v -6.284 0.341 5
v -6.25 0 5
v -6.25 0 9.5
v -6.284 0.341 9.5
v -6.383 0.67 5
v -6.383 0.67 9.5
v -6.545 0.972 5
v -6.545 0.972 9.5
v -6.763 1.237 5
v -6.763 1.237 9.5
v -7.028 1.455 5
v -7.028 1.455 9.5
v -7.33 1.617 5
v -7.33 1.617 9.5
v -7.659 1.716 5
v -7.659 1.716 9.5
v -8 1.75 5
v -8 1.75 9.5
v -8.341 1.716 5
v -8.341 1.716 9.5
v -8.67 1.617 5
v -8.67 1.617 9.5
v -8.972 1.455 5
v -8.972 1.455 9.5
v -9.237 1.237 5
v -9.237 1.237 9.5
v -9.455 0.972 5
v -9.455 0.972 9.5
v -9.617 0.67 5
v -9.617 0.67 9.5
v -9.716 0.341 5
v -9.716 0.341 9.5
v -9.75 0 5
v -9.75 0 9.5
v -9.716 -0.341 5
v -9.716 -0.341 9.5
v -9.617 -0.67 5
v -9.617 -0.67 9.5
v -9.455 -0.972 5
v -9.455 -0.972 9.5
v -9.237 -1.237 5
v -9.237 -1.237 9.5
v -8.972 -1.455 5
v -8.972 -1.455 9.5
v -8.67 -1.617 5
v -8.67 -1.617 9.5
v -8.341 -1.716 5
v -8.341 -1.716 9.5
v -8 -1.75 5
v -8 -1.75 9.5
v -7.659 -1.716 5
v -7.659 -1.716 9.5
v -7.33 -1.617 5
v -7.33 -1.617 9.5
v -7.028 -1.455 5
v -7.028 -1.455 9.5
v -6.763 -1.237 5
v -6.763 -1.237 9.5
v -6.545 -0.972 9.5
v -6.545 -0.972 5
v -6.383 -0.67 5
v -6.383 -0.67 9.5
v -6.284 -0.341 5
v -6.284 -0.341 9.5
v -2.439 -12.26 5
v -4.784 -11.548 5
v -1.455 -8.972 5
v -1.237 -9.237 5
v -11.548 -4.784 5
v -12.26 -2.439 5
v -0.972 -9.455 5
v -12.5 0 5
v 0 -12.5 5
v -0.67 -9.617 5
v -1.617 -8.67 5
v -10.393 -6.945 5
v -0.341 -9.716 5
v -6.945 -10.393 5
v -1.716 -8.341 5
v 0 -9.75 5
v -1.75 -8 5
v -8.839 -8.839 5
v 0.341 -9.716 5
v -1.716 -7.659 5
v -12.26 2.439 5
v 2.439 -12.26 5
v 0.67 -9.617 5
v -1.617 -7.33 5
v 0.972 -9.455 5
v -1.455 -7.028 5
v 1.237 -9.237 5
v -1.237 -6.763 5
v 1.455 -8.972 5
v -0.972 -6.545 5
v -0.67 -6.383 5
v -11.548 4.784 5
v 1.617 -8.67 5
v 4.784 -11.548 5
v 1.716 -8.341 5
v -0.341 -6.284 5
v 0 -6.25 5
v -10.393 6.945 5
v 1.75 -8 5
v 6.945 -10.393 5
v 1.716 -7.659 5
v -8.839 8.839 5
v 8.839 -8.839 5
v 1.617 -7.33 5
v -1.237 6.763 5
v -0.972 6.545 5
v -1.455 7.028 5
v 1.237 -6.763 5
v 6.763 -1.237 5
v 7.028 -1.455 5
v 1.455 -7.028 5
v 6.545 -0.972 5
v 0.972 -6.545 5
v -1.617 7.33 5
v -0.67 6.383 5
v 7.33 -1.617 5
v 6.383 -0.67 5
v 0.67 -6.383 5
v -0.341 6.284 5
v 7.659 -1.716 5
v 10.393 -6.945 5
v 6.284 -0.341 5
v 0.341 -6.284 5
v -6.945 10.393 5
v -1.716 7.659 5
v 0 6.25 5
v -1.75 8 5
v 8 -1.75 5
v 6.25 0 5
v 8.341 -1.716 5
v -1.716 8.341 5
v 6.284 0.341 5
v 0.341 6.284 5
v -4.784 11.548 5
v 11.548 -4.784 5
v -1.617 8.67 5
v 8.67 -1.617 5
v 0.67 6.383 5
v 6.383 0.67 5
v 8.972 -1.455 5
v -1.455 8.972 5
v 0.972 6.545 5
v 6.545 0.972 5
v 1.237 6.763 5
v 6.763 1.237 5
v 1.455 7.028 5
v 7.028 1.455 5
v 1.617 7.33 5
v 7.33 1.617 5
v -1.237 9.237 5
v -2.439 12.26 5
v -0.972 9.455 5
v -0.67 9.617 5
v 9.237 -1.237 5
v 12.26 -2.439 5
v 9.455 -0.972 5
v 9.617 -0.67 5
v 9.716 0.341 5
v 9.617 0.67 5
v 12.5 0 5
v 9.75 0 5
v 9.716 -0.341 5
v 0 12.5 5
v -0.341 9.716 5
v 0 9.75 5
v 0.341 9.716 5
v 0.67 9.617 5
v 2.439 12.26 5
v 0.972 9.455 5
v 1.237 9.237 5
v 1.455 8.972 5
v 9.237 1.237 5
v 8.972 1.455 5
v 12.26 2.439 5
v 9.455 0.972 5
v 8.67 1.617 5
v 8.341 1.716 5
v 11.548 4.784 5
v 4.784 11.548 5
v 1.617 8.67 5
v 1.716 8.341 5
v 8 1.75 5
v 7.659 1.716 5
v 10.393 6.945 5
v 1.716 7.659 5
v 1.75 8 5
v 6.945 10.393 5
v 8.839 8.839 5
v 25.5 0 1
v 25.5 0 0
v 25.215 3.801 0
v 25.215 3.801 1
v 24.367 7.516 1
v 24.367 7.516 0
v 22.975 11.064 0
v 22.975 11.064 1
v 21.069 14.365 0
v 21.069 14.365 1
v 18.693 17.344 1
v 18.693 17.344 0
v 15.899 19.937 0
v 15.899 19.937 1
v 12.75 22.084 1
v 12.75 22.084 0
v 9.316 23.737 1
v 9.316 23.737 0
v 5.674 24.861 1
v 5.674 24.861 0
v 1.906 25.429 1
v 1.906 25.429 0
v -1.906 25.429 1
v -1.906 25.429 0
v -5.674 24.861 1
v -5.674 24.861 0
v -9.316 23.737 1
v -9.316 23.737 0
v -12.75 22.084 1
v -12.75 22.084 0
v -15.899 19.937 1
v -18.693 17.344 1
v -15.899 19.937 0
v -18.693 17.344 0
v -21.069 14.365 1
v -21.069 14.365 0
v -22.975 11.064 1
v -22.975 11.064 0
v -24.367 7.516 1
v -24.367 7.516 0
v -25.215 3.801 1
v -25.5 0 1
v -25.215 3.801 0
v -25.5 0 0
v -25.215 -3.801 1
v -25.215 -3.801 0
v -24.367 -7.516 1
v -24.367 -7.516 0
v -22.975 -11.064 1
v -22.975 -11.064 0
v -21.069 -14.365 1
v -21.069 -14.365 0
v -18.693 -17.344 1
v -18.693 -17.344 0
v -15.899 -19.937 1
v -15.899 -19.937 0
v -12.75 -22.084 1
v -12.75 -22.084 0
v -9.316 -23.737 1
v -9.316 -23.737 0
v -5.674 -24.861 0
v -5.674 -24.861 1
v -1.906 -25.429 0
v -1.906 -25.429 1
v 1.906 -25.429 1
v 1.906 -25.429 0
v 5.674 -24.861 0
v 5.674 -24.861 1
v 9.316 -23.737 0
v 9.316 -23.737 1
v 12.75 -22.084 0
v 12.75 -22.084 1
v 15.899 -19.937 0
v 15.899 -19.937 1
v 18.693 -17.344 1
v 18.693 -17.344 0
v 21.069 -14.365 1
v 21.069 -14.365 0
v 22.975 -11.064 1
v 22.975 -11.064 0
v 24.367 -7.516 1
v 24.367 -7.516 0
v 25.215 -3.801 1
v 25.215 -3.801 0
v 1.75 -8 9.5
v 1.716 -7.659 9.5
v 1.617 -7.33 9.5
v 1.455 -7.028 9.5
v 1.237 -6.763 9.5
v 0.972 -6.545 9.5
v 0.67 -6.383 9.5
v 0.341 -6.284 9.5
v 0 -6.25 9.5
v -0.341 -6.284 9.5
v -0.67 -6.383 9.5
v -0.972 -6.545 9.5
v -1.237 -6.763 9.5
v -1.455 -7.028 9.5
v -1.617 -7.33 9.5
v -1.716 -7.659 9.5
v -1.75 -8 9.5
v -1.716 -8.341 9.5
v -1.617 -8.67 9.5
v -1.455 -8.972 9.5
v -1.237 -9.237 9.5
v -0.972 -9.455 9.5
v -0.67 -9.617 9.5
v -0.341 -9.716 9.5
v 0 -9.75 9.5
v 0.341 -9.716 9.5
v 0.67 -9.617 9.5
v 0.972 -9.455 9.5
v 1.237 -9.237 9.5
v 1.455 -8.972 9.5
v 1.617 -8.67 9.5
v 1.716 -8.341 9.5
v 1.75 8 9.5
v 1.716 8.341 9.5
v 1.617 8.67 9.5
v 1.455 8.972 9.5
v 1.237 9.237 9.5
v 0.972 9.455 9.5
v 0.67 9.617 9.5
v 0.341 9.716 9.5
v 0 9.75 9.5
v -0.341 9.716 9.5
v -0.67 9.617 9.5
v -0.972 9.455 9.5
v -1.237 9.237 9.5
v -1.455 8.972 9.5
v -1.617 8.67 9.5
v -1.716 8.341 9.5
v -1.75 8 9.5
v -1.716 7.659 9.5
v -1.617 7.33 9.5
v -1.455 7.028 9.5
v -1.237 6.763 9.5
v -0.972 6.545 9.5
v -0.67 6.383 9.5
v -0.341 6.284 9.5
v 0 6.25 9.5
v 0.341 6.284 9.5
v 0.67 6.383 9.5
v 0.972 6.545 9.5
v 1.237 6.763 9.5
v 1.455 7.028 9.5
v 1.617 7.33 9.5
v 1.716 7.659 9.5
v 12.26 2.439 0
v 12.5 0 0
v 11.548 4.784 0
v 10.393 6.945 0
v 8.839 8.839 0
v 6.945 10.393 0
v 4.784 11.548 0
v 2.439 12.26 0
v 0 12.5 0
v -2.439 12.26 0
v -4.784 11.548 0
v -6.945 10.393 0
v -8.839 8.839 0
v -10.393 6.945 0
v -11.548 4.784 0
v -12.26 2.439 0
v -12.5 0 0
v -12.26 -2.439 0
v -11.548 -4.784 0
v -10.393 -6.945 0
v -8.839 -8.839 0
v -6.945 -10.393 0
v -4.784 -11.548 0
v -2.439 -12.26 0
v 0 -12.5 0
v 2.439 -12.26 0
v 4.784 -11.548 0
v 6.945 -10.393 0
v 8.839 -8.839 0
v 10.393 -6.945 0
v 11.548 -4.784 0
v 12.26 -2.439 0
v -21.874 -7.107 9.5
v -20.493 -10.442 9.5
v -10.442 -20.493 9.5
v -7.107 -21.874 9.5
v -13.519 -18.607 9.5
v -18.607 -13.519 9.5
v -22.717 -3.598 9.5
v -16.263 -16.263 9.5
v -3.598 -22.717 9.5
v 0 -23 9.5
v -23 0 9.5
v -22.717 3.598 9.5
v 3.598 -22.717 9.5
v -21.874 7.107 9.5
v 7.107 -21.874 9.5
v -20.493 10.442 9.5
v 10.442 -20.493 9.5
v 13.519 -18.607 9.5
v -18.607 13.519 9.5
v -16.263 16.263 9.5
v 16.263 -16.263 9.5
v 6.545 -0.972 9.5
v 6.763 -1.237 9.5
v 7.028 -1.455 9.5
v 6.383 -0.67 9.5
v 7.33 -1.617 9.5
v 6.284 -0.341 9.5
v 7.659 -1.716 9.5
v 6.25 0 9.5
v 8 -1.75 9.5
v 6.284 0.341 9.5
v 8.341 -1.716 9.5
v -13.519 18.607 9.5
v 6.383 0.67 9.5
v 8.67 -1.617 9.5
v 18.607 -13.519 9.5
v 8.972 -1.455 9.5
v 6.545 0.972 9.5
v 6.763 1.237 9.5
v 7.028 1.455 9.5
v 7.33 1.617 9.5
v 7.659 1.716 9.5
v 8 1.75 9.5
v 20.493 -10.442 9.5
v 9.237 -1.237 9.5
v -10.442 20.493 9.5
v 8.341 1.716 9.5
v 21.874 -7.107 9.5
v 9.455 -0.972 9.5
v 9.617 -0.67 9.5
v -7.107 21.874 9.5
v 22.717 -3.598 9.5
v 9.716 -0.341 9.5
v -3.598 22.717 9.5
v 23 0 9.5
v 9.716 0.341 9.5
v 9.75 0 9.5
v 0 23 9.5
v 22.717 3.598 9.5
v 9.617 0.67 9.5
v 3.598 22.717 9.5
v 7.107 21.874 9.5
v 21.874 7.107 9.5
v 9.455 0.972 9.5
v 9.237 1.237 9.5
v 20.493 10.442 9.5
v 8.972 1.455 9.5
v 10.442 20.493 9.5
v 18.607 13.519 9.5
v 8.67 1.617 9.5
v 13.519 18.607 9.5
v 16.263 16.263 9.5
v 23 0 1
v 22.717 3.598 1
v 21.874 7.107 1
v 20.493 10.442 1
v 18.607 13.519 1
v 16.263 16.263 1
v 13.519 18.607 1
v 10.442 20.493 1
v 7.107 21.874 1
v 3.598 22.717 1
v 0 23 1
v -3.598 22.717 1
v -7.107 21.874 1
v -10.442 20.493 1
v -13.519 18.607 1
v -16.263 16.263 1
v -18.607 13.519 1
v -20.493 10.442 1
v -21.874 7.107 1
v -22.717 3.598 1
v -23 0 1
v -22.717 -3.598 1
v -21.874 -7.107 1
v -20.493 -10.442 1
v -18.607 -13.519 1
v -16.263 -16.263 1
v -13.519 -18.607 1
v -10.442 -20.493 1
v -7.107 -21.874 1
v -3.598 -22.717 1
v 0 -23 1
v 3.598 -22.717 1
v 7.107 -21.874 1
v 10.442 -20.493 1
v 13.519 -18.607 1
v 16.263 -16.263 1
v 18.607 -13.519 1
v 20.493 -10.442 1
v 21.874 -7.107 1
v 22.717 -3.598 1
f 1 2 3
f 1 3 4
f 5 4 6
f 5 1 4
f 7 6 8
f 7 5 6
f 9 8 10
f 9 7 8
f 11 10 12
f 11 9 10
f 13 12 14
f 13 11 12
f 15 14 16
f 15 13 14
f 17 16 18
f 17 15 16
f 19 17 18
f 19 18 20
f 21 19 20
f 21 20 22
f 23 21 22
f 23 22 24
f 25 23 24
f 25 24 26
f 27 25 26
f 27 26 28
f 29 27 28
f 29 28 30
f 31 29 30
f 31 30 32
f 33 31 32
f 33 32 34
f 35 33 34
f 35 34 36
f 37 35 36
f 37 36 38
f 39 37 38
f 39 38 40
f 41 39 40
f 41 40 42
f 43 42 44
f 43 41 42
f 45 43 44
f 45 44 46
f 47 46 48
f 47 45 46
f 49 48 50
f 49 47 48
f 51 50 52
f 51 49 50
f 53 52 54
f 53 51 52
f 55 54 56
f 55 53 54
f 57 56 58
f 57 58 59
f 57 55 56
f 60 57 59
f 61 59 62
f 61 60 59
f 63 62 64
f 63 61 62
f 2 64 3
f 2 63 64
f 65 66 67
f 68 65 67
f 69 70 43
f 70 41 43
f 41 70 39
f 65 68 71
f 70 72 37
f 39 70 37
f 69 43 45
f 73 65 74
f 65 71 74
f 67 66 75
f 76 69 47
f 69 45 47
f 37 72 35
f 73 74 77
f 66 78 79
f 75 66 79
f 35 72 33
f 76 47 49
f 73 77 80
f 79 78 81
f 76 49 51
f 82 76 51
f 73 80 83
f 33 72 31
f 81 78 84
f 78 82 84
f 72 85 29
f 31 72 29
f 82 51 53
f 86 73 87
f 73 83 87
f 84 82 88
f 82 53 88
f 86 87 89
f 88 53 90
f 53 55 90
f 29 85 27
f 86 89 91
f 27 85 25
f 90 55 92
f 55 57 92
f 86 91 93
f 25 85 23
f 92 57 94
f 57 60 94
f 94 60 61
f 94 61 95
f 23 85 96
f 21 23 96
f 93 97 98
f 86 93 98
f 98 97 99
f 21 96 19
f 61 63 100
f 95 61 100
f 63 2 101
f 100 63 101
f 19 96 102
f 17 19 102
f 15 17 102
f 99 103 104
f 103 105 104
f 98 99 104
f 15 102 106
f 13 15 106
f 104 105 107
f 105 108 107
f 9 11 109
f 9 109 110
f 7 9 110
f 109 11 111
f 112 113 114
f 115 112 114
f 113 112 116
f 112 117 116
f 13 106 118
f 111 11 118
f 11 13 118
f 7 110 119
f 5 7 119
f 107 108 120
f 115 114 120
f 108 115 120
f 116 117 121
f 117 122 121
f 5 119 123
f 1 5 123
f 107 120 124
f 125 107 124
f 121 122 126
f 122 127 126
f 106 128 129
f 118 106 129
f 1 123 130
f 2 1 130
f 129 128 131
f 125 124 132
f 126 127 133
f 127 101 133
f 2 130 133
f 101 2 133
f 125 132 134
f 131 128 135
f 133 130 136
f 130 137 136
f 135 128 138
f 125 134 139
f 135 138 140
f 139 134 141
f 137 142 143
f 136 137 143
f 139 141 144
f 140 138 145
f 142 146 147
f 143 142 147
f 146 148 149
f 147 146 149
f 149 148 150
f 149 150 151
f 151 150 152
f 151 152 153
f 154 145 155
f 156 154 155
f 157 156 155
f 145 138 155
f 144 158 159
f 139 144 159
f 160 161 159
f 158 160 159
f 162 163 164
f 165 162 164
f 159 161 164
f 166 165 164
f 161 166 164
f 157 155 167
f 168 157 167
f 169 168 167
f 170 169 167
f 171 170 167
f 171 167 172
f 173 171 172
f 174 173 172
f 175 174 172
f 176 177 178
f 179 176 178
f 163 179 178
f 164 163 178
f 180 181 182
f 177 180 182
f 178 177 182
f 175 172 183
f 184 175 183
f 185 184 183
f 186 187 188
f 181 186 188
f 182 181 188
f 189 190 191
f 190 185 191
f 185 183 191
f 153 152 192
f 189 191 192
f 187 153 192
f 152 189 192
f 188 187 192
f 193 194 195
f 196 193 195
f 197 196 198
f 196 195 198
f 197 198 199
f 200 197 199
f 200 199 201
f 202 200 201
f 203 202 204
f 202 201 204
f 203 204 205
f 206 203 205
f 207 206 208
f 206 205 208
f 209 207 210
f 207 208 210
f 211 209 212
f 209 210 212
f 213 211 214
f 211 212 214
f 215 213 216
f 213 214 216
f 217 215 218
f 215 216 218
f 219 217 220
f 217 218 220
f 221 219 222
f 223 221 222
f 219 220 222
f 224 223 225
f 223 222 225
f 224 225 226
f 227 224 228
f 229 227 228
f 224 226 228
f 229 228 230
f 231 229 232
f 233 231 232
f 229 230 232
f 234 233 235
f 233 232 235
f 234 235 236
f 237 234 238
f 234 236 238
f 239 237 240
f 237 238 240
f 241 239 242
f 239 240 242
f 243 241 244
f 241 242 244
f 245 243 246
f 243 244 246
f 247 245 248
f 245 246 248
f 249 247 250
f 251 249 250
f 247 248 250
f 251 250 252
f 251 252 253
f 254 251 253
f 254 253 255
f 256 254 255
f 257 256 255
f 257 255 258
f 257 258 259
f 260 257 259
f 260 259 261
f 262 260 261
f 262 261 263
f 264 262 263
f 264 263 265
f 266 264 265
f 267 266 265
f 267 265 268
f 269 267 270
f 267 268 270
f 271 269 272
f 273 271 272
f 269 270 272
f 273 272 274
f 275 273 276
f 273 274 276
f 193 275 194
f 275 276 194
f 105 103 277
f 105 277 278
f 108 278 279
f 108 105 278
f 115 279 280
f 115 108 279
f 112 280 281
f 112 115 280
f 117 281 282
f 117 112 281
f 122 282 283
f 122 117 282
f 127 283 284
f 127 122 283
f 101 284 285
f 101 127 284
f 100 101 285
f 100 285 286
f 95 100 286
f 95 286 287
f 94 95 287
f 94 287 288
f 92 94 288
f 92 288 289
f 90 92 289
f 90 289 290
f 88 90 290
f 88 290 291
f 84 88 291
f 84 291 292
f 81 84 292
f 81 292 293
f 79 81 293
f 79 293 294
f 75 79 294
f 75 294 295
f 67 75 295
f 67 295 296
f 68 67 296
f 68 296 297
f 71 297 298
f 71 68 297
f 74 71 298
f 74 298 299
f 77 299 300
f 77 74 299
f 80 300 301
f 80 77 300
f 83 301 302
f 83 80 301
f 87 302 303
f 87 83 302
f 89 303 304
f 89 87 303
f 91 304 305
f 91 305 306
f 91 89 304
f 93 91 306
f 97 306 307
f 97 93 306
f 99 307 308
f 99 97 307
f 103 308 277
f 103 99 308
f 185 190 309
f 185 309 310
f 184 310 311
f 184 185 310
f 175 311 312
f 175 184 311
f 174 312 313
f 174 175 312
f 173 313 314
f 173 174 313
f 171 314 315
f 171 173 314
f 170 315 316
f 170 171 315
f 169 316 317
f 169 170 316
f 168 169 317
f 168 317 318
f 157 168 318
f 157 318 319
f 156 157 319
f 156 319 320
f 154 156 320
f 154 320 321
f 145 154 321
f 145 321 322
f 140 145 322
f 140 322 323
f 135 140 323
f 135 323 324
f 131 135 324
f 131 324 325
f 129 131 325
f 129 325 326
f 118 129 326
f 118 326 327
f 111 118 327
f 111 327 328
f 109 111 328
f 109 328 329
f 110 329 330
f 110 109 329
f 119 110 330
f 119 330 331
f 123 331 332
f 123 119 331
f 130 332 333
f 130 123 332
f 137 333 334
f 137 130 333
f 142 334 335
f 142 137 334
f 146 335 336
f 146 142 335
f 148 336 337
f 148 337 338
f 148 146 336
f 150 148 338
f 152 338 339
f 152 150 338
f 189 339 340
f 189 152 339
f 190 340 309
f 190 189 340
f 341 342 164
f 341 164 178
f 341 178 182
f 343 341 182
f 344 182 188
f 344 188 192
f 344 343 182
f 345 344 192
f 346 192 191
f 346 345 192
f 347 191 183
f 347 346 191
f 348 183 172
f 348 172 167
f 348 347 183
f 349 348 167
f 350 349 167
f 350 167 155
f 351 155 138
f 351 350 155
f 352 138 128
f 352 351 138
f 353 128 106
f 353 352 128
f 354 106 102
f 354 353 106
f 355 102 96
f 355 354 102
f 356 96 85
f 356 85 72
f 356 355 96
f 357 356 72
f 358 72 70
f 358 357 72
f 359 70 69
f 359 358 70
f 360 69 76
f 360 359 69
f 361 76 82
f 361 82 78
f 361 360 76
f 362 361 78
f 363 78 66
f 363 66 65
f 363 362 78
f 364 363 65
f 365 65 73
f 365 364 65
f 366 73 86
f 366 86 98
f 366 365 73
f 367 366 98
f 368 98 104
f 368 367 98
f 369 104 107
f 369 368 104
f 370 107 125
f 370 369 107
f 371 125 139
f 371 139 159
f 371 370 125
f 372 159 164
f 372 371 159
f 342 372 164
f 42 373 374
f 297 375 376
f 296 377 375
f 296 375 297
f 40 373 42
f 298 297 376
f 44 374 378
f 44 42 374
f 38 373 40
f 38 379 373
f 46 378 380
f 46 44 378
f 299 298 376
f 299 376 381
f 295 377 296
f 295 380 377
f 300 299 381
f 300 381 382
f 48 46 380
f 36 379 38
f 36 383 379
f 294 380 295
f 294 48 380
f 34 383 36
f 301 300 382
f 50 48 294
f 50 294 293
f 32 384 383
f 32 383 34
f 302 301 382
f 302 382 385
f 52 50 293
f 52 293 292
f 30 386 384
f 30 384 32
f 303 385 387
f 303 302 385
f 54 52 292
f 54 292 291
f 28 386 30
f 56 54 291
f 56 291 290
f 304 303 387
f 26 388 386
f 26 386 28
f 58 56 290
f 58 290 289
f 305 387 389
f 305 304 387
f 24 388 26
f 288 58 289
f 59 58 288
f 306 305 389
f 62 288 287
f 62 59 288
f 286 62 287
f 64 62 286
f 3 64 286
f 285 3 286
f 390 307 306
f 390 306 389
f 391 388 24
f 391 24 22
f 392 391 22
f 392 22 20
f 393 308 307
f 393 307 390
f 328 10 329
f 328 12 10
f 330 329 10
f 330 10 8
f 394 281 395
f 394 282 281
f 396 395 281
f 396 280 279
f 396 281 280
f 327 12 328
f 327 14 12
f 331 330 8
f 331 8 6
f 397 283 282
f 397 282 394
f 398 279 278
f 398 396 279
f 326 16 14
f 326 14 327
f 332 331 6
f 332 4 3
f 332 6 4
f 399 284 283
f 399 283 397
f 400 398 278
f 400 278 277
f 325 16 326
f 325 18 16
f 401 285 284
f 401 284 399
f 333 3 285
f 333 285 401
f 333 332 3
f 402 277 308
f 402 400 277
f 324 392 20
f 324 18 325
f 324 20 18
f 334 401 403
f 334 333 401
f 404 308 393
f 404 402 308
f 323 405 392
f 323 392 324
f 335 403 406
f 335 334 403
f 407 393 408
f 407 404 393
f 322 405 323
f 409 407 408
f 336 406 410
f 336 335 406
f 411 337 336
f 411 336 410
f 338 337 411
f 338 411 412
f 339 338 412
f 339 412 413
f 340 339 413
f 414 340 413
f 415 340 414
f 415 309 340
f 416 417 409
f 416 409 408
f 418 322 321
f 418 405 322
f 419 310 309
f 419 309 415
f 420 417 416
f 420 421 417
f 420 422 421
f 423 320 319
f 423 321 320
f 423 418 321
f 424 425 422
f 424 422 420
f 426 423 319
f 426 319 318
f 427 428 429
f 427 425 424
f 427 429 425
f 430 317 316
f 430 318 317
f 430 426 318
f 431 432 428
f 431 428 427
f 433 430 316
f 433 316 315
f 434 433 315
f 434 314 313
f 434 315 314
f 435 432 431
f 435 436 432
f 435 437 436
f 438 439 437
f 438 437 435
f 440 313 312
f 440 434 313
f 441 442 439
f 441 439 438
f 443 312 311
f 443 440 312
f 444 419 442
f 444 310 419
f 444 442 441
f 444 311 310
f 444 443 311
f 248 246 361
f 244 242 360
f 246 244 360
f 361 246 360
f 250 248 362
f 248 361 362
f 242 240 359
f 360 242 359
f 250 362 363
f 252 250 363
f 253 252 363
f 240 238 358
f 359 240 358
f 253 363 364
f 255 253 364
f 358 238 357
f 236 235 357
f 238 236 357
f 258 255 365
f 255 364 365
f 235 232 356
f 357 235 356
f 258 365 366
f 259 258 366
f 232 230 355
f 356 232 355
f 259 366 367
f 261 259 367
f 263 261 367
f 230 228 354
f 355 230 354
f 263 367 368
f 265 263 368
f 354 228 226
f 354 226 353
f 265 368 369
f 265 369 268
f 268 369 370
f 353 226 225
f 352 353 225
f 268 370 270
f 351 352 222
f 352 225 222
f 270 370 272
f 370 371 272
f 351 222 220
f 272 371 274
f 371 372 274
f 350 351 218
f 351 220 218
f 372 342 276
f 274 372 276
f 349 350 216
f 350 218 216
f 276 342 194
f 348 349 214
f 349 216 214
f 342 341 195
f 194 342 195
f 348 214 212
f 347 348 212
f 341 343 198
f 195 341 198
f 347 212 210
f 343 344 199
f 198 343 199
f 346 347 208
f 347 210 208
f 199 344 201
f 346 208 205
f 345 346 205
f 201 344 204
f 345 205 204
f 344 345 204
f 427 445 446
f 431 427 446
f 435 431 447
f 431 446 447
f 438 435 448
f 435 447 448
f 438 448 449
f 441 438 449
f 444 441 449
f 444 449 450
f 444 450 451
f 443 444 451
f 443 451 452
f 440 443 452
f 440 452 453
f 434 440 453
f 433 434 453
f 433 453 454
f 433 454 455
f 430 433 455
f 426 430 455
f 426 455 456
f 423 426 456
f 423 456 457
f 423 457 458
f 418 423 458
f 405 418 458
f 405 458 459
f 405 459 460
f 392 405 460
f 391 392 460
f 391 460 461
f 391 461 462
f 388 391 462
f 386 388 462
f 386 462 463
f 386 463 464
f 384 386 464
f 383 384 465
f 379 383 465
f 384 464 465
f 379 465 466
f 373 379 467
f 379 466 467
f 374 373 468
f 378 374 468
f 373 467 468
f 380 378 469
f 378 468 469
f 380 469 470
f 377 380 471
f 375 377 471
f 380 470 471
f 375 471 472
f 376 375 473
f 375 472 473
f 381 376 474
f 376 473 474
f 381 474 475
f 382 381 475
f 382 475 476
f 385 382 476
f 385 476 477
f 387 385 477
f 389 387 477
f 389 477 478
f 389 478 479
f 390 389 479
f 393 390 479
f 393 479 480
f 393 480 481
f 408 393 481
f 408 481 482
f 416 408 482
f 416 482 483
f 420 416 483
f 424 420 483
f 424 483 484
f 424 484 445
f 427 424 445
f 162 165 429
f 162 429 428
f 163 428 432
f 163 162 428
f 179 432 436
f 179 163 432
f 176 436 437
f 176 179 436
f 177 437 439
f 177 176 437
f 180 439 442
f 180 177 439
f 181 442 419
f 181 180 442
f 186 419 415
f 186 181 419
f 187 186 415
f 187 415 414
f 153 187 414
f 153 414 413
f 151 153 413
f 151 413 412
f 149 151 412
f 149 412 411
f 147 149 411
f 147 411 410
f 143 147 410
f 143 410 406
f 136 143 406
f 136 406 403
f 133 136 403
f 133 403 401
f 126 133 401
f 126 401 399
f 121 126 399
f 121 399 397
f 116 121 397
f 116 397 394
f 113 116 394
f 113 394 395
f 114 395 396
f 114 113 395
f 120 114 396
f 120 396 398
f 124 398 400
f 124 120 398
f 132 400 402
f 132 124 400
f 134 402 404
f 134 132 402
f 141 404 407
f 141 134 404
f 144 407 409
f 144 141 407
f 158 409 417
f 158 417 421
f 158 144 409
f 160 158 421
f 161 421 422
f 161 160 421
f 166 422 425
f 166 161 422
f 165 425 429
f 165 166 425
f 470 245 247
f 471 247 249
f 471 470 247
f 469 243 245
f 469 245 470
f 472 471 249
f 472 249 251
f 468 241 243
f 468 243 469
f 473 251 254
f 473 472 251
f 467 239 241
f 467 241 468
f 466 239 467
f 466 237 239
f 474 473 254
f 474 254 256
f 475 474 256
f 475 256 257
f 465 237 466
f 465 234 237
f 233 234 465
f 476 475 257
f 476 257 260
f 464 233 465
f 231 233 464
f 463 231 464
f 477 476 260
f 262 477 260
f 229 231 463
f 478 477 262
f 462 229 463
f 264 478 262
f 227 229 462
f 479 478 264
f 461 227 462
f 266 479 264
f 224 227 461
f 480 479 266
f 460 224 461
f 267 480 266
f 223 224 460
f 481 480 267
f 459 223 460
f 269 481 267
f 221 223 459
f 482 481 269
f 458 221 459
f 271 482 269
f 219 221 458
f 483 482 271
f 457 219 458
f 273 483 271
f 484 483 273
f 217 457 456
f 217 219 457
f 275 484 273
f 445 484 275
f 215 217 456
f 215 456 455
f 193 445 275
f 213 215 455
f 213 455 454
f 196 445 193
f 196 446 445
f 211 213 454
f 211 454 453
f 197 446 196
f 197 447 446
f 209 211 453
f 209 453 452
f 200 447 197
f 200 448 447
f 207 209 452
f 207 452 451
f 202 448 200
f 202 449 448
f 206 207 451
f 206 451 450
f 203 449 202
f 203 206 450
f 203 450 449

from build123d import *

# Parameters (mm, degrees)
SKETCH1_R           = 23
SKETCH1_R_2         = 1.75
BOSS_EXTRUDE1_DEPTH = 9.5
SKETCH1_3_R         = 25.5
SKETCH1_3_R_2       = 23
BOSS_EXTRUDE2_DEPTH = 1
SKETCH1_4_R         = 12.5
SKETCH1_4_R_2       = 1.75
CUT_EXTRUDE1_DEPTH  = 5


with BuildPart() as part:
    # Sketch1 → Boss-Extrude1 (new body)
    with BuildSketch(Plane.XY):
        Circle(SKETCH1_R)
        with Locations((0, 8)):
            Circle(SKETCH1_R_2, mode=Mode.SUBTRACT)
        with Locations((0, -8)):
            Circle(SKETCH1_R_2, mode=Mode.SUBTRACT)
        with Locations((8, 0)):
            Circle(SKETCH1_R_2, mode=Mode.SUBTRACT)
        with Locations((-8, 0)):
            Circle(SKETCH1_R_2, mode=Mode.SUBTRACT)
    extrude(amount=BOSS_EXTRUDE1_DEPTH)

    # Sketch1<3> → Boss-Extrude2 (add)
    with BuildSketch(Plane.XY):
        Circle(SKETCH1_3_R)
        Circle(SKETCH1_3_R_2, mode=Mode.SUBTRACT)
    extrude(amount=BOSS_EXTRUDE2_DEPTH)

    # Sketch1<4> → Cut-Extrude1 (cut)
    with BuildSketch(Plane.XY):
        Circle(SKETCH1_4_R)
        with Locations((0, -8)):
            Circle(SKETCH1_4_R_2, mode=Mode.SUBTRACT)
        with Locations((8, 0)):
            Circle(SKETCH1_4_R_2, mode=Mode.SUBTRACT)
        with Locations((-8, 0)):
            Circle(SKETCH1_4_R_2, mode=Mode.SUBTRACT)
        with Locations((0, 8)):
            Circle(SKETCH1_4_R_2, mode=Mode.SUBTRACT)
    extrude(amount=CUT_EXTRUDE1_DEPTH, mode=Mode.SUBTRACT)


solid = part.part
